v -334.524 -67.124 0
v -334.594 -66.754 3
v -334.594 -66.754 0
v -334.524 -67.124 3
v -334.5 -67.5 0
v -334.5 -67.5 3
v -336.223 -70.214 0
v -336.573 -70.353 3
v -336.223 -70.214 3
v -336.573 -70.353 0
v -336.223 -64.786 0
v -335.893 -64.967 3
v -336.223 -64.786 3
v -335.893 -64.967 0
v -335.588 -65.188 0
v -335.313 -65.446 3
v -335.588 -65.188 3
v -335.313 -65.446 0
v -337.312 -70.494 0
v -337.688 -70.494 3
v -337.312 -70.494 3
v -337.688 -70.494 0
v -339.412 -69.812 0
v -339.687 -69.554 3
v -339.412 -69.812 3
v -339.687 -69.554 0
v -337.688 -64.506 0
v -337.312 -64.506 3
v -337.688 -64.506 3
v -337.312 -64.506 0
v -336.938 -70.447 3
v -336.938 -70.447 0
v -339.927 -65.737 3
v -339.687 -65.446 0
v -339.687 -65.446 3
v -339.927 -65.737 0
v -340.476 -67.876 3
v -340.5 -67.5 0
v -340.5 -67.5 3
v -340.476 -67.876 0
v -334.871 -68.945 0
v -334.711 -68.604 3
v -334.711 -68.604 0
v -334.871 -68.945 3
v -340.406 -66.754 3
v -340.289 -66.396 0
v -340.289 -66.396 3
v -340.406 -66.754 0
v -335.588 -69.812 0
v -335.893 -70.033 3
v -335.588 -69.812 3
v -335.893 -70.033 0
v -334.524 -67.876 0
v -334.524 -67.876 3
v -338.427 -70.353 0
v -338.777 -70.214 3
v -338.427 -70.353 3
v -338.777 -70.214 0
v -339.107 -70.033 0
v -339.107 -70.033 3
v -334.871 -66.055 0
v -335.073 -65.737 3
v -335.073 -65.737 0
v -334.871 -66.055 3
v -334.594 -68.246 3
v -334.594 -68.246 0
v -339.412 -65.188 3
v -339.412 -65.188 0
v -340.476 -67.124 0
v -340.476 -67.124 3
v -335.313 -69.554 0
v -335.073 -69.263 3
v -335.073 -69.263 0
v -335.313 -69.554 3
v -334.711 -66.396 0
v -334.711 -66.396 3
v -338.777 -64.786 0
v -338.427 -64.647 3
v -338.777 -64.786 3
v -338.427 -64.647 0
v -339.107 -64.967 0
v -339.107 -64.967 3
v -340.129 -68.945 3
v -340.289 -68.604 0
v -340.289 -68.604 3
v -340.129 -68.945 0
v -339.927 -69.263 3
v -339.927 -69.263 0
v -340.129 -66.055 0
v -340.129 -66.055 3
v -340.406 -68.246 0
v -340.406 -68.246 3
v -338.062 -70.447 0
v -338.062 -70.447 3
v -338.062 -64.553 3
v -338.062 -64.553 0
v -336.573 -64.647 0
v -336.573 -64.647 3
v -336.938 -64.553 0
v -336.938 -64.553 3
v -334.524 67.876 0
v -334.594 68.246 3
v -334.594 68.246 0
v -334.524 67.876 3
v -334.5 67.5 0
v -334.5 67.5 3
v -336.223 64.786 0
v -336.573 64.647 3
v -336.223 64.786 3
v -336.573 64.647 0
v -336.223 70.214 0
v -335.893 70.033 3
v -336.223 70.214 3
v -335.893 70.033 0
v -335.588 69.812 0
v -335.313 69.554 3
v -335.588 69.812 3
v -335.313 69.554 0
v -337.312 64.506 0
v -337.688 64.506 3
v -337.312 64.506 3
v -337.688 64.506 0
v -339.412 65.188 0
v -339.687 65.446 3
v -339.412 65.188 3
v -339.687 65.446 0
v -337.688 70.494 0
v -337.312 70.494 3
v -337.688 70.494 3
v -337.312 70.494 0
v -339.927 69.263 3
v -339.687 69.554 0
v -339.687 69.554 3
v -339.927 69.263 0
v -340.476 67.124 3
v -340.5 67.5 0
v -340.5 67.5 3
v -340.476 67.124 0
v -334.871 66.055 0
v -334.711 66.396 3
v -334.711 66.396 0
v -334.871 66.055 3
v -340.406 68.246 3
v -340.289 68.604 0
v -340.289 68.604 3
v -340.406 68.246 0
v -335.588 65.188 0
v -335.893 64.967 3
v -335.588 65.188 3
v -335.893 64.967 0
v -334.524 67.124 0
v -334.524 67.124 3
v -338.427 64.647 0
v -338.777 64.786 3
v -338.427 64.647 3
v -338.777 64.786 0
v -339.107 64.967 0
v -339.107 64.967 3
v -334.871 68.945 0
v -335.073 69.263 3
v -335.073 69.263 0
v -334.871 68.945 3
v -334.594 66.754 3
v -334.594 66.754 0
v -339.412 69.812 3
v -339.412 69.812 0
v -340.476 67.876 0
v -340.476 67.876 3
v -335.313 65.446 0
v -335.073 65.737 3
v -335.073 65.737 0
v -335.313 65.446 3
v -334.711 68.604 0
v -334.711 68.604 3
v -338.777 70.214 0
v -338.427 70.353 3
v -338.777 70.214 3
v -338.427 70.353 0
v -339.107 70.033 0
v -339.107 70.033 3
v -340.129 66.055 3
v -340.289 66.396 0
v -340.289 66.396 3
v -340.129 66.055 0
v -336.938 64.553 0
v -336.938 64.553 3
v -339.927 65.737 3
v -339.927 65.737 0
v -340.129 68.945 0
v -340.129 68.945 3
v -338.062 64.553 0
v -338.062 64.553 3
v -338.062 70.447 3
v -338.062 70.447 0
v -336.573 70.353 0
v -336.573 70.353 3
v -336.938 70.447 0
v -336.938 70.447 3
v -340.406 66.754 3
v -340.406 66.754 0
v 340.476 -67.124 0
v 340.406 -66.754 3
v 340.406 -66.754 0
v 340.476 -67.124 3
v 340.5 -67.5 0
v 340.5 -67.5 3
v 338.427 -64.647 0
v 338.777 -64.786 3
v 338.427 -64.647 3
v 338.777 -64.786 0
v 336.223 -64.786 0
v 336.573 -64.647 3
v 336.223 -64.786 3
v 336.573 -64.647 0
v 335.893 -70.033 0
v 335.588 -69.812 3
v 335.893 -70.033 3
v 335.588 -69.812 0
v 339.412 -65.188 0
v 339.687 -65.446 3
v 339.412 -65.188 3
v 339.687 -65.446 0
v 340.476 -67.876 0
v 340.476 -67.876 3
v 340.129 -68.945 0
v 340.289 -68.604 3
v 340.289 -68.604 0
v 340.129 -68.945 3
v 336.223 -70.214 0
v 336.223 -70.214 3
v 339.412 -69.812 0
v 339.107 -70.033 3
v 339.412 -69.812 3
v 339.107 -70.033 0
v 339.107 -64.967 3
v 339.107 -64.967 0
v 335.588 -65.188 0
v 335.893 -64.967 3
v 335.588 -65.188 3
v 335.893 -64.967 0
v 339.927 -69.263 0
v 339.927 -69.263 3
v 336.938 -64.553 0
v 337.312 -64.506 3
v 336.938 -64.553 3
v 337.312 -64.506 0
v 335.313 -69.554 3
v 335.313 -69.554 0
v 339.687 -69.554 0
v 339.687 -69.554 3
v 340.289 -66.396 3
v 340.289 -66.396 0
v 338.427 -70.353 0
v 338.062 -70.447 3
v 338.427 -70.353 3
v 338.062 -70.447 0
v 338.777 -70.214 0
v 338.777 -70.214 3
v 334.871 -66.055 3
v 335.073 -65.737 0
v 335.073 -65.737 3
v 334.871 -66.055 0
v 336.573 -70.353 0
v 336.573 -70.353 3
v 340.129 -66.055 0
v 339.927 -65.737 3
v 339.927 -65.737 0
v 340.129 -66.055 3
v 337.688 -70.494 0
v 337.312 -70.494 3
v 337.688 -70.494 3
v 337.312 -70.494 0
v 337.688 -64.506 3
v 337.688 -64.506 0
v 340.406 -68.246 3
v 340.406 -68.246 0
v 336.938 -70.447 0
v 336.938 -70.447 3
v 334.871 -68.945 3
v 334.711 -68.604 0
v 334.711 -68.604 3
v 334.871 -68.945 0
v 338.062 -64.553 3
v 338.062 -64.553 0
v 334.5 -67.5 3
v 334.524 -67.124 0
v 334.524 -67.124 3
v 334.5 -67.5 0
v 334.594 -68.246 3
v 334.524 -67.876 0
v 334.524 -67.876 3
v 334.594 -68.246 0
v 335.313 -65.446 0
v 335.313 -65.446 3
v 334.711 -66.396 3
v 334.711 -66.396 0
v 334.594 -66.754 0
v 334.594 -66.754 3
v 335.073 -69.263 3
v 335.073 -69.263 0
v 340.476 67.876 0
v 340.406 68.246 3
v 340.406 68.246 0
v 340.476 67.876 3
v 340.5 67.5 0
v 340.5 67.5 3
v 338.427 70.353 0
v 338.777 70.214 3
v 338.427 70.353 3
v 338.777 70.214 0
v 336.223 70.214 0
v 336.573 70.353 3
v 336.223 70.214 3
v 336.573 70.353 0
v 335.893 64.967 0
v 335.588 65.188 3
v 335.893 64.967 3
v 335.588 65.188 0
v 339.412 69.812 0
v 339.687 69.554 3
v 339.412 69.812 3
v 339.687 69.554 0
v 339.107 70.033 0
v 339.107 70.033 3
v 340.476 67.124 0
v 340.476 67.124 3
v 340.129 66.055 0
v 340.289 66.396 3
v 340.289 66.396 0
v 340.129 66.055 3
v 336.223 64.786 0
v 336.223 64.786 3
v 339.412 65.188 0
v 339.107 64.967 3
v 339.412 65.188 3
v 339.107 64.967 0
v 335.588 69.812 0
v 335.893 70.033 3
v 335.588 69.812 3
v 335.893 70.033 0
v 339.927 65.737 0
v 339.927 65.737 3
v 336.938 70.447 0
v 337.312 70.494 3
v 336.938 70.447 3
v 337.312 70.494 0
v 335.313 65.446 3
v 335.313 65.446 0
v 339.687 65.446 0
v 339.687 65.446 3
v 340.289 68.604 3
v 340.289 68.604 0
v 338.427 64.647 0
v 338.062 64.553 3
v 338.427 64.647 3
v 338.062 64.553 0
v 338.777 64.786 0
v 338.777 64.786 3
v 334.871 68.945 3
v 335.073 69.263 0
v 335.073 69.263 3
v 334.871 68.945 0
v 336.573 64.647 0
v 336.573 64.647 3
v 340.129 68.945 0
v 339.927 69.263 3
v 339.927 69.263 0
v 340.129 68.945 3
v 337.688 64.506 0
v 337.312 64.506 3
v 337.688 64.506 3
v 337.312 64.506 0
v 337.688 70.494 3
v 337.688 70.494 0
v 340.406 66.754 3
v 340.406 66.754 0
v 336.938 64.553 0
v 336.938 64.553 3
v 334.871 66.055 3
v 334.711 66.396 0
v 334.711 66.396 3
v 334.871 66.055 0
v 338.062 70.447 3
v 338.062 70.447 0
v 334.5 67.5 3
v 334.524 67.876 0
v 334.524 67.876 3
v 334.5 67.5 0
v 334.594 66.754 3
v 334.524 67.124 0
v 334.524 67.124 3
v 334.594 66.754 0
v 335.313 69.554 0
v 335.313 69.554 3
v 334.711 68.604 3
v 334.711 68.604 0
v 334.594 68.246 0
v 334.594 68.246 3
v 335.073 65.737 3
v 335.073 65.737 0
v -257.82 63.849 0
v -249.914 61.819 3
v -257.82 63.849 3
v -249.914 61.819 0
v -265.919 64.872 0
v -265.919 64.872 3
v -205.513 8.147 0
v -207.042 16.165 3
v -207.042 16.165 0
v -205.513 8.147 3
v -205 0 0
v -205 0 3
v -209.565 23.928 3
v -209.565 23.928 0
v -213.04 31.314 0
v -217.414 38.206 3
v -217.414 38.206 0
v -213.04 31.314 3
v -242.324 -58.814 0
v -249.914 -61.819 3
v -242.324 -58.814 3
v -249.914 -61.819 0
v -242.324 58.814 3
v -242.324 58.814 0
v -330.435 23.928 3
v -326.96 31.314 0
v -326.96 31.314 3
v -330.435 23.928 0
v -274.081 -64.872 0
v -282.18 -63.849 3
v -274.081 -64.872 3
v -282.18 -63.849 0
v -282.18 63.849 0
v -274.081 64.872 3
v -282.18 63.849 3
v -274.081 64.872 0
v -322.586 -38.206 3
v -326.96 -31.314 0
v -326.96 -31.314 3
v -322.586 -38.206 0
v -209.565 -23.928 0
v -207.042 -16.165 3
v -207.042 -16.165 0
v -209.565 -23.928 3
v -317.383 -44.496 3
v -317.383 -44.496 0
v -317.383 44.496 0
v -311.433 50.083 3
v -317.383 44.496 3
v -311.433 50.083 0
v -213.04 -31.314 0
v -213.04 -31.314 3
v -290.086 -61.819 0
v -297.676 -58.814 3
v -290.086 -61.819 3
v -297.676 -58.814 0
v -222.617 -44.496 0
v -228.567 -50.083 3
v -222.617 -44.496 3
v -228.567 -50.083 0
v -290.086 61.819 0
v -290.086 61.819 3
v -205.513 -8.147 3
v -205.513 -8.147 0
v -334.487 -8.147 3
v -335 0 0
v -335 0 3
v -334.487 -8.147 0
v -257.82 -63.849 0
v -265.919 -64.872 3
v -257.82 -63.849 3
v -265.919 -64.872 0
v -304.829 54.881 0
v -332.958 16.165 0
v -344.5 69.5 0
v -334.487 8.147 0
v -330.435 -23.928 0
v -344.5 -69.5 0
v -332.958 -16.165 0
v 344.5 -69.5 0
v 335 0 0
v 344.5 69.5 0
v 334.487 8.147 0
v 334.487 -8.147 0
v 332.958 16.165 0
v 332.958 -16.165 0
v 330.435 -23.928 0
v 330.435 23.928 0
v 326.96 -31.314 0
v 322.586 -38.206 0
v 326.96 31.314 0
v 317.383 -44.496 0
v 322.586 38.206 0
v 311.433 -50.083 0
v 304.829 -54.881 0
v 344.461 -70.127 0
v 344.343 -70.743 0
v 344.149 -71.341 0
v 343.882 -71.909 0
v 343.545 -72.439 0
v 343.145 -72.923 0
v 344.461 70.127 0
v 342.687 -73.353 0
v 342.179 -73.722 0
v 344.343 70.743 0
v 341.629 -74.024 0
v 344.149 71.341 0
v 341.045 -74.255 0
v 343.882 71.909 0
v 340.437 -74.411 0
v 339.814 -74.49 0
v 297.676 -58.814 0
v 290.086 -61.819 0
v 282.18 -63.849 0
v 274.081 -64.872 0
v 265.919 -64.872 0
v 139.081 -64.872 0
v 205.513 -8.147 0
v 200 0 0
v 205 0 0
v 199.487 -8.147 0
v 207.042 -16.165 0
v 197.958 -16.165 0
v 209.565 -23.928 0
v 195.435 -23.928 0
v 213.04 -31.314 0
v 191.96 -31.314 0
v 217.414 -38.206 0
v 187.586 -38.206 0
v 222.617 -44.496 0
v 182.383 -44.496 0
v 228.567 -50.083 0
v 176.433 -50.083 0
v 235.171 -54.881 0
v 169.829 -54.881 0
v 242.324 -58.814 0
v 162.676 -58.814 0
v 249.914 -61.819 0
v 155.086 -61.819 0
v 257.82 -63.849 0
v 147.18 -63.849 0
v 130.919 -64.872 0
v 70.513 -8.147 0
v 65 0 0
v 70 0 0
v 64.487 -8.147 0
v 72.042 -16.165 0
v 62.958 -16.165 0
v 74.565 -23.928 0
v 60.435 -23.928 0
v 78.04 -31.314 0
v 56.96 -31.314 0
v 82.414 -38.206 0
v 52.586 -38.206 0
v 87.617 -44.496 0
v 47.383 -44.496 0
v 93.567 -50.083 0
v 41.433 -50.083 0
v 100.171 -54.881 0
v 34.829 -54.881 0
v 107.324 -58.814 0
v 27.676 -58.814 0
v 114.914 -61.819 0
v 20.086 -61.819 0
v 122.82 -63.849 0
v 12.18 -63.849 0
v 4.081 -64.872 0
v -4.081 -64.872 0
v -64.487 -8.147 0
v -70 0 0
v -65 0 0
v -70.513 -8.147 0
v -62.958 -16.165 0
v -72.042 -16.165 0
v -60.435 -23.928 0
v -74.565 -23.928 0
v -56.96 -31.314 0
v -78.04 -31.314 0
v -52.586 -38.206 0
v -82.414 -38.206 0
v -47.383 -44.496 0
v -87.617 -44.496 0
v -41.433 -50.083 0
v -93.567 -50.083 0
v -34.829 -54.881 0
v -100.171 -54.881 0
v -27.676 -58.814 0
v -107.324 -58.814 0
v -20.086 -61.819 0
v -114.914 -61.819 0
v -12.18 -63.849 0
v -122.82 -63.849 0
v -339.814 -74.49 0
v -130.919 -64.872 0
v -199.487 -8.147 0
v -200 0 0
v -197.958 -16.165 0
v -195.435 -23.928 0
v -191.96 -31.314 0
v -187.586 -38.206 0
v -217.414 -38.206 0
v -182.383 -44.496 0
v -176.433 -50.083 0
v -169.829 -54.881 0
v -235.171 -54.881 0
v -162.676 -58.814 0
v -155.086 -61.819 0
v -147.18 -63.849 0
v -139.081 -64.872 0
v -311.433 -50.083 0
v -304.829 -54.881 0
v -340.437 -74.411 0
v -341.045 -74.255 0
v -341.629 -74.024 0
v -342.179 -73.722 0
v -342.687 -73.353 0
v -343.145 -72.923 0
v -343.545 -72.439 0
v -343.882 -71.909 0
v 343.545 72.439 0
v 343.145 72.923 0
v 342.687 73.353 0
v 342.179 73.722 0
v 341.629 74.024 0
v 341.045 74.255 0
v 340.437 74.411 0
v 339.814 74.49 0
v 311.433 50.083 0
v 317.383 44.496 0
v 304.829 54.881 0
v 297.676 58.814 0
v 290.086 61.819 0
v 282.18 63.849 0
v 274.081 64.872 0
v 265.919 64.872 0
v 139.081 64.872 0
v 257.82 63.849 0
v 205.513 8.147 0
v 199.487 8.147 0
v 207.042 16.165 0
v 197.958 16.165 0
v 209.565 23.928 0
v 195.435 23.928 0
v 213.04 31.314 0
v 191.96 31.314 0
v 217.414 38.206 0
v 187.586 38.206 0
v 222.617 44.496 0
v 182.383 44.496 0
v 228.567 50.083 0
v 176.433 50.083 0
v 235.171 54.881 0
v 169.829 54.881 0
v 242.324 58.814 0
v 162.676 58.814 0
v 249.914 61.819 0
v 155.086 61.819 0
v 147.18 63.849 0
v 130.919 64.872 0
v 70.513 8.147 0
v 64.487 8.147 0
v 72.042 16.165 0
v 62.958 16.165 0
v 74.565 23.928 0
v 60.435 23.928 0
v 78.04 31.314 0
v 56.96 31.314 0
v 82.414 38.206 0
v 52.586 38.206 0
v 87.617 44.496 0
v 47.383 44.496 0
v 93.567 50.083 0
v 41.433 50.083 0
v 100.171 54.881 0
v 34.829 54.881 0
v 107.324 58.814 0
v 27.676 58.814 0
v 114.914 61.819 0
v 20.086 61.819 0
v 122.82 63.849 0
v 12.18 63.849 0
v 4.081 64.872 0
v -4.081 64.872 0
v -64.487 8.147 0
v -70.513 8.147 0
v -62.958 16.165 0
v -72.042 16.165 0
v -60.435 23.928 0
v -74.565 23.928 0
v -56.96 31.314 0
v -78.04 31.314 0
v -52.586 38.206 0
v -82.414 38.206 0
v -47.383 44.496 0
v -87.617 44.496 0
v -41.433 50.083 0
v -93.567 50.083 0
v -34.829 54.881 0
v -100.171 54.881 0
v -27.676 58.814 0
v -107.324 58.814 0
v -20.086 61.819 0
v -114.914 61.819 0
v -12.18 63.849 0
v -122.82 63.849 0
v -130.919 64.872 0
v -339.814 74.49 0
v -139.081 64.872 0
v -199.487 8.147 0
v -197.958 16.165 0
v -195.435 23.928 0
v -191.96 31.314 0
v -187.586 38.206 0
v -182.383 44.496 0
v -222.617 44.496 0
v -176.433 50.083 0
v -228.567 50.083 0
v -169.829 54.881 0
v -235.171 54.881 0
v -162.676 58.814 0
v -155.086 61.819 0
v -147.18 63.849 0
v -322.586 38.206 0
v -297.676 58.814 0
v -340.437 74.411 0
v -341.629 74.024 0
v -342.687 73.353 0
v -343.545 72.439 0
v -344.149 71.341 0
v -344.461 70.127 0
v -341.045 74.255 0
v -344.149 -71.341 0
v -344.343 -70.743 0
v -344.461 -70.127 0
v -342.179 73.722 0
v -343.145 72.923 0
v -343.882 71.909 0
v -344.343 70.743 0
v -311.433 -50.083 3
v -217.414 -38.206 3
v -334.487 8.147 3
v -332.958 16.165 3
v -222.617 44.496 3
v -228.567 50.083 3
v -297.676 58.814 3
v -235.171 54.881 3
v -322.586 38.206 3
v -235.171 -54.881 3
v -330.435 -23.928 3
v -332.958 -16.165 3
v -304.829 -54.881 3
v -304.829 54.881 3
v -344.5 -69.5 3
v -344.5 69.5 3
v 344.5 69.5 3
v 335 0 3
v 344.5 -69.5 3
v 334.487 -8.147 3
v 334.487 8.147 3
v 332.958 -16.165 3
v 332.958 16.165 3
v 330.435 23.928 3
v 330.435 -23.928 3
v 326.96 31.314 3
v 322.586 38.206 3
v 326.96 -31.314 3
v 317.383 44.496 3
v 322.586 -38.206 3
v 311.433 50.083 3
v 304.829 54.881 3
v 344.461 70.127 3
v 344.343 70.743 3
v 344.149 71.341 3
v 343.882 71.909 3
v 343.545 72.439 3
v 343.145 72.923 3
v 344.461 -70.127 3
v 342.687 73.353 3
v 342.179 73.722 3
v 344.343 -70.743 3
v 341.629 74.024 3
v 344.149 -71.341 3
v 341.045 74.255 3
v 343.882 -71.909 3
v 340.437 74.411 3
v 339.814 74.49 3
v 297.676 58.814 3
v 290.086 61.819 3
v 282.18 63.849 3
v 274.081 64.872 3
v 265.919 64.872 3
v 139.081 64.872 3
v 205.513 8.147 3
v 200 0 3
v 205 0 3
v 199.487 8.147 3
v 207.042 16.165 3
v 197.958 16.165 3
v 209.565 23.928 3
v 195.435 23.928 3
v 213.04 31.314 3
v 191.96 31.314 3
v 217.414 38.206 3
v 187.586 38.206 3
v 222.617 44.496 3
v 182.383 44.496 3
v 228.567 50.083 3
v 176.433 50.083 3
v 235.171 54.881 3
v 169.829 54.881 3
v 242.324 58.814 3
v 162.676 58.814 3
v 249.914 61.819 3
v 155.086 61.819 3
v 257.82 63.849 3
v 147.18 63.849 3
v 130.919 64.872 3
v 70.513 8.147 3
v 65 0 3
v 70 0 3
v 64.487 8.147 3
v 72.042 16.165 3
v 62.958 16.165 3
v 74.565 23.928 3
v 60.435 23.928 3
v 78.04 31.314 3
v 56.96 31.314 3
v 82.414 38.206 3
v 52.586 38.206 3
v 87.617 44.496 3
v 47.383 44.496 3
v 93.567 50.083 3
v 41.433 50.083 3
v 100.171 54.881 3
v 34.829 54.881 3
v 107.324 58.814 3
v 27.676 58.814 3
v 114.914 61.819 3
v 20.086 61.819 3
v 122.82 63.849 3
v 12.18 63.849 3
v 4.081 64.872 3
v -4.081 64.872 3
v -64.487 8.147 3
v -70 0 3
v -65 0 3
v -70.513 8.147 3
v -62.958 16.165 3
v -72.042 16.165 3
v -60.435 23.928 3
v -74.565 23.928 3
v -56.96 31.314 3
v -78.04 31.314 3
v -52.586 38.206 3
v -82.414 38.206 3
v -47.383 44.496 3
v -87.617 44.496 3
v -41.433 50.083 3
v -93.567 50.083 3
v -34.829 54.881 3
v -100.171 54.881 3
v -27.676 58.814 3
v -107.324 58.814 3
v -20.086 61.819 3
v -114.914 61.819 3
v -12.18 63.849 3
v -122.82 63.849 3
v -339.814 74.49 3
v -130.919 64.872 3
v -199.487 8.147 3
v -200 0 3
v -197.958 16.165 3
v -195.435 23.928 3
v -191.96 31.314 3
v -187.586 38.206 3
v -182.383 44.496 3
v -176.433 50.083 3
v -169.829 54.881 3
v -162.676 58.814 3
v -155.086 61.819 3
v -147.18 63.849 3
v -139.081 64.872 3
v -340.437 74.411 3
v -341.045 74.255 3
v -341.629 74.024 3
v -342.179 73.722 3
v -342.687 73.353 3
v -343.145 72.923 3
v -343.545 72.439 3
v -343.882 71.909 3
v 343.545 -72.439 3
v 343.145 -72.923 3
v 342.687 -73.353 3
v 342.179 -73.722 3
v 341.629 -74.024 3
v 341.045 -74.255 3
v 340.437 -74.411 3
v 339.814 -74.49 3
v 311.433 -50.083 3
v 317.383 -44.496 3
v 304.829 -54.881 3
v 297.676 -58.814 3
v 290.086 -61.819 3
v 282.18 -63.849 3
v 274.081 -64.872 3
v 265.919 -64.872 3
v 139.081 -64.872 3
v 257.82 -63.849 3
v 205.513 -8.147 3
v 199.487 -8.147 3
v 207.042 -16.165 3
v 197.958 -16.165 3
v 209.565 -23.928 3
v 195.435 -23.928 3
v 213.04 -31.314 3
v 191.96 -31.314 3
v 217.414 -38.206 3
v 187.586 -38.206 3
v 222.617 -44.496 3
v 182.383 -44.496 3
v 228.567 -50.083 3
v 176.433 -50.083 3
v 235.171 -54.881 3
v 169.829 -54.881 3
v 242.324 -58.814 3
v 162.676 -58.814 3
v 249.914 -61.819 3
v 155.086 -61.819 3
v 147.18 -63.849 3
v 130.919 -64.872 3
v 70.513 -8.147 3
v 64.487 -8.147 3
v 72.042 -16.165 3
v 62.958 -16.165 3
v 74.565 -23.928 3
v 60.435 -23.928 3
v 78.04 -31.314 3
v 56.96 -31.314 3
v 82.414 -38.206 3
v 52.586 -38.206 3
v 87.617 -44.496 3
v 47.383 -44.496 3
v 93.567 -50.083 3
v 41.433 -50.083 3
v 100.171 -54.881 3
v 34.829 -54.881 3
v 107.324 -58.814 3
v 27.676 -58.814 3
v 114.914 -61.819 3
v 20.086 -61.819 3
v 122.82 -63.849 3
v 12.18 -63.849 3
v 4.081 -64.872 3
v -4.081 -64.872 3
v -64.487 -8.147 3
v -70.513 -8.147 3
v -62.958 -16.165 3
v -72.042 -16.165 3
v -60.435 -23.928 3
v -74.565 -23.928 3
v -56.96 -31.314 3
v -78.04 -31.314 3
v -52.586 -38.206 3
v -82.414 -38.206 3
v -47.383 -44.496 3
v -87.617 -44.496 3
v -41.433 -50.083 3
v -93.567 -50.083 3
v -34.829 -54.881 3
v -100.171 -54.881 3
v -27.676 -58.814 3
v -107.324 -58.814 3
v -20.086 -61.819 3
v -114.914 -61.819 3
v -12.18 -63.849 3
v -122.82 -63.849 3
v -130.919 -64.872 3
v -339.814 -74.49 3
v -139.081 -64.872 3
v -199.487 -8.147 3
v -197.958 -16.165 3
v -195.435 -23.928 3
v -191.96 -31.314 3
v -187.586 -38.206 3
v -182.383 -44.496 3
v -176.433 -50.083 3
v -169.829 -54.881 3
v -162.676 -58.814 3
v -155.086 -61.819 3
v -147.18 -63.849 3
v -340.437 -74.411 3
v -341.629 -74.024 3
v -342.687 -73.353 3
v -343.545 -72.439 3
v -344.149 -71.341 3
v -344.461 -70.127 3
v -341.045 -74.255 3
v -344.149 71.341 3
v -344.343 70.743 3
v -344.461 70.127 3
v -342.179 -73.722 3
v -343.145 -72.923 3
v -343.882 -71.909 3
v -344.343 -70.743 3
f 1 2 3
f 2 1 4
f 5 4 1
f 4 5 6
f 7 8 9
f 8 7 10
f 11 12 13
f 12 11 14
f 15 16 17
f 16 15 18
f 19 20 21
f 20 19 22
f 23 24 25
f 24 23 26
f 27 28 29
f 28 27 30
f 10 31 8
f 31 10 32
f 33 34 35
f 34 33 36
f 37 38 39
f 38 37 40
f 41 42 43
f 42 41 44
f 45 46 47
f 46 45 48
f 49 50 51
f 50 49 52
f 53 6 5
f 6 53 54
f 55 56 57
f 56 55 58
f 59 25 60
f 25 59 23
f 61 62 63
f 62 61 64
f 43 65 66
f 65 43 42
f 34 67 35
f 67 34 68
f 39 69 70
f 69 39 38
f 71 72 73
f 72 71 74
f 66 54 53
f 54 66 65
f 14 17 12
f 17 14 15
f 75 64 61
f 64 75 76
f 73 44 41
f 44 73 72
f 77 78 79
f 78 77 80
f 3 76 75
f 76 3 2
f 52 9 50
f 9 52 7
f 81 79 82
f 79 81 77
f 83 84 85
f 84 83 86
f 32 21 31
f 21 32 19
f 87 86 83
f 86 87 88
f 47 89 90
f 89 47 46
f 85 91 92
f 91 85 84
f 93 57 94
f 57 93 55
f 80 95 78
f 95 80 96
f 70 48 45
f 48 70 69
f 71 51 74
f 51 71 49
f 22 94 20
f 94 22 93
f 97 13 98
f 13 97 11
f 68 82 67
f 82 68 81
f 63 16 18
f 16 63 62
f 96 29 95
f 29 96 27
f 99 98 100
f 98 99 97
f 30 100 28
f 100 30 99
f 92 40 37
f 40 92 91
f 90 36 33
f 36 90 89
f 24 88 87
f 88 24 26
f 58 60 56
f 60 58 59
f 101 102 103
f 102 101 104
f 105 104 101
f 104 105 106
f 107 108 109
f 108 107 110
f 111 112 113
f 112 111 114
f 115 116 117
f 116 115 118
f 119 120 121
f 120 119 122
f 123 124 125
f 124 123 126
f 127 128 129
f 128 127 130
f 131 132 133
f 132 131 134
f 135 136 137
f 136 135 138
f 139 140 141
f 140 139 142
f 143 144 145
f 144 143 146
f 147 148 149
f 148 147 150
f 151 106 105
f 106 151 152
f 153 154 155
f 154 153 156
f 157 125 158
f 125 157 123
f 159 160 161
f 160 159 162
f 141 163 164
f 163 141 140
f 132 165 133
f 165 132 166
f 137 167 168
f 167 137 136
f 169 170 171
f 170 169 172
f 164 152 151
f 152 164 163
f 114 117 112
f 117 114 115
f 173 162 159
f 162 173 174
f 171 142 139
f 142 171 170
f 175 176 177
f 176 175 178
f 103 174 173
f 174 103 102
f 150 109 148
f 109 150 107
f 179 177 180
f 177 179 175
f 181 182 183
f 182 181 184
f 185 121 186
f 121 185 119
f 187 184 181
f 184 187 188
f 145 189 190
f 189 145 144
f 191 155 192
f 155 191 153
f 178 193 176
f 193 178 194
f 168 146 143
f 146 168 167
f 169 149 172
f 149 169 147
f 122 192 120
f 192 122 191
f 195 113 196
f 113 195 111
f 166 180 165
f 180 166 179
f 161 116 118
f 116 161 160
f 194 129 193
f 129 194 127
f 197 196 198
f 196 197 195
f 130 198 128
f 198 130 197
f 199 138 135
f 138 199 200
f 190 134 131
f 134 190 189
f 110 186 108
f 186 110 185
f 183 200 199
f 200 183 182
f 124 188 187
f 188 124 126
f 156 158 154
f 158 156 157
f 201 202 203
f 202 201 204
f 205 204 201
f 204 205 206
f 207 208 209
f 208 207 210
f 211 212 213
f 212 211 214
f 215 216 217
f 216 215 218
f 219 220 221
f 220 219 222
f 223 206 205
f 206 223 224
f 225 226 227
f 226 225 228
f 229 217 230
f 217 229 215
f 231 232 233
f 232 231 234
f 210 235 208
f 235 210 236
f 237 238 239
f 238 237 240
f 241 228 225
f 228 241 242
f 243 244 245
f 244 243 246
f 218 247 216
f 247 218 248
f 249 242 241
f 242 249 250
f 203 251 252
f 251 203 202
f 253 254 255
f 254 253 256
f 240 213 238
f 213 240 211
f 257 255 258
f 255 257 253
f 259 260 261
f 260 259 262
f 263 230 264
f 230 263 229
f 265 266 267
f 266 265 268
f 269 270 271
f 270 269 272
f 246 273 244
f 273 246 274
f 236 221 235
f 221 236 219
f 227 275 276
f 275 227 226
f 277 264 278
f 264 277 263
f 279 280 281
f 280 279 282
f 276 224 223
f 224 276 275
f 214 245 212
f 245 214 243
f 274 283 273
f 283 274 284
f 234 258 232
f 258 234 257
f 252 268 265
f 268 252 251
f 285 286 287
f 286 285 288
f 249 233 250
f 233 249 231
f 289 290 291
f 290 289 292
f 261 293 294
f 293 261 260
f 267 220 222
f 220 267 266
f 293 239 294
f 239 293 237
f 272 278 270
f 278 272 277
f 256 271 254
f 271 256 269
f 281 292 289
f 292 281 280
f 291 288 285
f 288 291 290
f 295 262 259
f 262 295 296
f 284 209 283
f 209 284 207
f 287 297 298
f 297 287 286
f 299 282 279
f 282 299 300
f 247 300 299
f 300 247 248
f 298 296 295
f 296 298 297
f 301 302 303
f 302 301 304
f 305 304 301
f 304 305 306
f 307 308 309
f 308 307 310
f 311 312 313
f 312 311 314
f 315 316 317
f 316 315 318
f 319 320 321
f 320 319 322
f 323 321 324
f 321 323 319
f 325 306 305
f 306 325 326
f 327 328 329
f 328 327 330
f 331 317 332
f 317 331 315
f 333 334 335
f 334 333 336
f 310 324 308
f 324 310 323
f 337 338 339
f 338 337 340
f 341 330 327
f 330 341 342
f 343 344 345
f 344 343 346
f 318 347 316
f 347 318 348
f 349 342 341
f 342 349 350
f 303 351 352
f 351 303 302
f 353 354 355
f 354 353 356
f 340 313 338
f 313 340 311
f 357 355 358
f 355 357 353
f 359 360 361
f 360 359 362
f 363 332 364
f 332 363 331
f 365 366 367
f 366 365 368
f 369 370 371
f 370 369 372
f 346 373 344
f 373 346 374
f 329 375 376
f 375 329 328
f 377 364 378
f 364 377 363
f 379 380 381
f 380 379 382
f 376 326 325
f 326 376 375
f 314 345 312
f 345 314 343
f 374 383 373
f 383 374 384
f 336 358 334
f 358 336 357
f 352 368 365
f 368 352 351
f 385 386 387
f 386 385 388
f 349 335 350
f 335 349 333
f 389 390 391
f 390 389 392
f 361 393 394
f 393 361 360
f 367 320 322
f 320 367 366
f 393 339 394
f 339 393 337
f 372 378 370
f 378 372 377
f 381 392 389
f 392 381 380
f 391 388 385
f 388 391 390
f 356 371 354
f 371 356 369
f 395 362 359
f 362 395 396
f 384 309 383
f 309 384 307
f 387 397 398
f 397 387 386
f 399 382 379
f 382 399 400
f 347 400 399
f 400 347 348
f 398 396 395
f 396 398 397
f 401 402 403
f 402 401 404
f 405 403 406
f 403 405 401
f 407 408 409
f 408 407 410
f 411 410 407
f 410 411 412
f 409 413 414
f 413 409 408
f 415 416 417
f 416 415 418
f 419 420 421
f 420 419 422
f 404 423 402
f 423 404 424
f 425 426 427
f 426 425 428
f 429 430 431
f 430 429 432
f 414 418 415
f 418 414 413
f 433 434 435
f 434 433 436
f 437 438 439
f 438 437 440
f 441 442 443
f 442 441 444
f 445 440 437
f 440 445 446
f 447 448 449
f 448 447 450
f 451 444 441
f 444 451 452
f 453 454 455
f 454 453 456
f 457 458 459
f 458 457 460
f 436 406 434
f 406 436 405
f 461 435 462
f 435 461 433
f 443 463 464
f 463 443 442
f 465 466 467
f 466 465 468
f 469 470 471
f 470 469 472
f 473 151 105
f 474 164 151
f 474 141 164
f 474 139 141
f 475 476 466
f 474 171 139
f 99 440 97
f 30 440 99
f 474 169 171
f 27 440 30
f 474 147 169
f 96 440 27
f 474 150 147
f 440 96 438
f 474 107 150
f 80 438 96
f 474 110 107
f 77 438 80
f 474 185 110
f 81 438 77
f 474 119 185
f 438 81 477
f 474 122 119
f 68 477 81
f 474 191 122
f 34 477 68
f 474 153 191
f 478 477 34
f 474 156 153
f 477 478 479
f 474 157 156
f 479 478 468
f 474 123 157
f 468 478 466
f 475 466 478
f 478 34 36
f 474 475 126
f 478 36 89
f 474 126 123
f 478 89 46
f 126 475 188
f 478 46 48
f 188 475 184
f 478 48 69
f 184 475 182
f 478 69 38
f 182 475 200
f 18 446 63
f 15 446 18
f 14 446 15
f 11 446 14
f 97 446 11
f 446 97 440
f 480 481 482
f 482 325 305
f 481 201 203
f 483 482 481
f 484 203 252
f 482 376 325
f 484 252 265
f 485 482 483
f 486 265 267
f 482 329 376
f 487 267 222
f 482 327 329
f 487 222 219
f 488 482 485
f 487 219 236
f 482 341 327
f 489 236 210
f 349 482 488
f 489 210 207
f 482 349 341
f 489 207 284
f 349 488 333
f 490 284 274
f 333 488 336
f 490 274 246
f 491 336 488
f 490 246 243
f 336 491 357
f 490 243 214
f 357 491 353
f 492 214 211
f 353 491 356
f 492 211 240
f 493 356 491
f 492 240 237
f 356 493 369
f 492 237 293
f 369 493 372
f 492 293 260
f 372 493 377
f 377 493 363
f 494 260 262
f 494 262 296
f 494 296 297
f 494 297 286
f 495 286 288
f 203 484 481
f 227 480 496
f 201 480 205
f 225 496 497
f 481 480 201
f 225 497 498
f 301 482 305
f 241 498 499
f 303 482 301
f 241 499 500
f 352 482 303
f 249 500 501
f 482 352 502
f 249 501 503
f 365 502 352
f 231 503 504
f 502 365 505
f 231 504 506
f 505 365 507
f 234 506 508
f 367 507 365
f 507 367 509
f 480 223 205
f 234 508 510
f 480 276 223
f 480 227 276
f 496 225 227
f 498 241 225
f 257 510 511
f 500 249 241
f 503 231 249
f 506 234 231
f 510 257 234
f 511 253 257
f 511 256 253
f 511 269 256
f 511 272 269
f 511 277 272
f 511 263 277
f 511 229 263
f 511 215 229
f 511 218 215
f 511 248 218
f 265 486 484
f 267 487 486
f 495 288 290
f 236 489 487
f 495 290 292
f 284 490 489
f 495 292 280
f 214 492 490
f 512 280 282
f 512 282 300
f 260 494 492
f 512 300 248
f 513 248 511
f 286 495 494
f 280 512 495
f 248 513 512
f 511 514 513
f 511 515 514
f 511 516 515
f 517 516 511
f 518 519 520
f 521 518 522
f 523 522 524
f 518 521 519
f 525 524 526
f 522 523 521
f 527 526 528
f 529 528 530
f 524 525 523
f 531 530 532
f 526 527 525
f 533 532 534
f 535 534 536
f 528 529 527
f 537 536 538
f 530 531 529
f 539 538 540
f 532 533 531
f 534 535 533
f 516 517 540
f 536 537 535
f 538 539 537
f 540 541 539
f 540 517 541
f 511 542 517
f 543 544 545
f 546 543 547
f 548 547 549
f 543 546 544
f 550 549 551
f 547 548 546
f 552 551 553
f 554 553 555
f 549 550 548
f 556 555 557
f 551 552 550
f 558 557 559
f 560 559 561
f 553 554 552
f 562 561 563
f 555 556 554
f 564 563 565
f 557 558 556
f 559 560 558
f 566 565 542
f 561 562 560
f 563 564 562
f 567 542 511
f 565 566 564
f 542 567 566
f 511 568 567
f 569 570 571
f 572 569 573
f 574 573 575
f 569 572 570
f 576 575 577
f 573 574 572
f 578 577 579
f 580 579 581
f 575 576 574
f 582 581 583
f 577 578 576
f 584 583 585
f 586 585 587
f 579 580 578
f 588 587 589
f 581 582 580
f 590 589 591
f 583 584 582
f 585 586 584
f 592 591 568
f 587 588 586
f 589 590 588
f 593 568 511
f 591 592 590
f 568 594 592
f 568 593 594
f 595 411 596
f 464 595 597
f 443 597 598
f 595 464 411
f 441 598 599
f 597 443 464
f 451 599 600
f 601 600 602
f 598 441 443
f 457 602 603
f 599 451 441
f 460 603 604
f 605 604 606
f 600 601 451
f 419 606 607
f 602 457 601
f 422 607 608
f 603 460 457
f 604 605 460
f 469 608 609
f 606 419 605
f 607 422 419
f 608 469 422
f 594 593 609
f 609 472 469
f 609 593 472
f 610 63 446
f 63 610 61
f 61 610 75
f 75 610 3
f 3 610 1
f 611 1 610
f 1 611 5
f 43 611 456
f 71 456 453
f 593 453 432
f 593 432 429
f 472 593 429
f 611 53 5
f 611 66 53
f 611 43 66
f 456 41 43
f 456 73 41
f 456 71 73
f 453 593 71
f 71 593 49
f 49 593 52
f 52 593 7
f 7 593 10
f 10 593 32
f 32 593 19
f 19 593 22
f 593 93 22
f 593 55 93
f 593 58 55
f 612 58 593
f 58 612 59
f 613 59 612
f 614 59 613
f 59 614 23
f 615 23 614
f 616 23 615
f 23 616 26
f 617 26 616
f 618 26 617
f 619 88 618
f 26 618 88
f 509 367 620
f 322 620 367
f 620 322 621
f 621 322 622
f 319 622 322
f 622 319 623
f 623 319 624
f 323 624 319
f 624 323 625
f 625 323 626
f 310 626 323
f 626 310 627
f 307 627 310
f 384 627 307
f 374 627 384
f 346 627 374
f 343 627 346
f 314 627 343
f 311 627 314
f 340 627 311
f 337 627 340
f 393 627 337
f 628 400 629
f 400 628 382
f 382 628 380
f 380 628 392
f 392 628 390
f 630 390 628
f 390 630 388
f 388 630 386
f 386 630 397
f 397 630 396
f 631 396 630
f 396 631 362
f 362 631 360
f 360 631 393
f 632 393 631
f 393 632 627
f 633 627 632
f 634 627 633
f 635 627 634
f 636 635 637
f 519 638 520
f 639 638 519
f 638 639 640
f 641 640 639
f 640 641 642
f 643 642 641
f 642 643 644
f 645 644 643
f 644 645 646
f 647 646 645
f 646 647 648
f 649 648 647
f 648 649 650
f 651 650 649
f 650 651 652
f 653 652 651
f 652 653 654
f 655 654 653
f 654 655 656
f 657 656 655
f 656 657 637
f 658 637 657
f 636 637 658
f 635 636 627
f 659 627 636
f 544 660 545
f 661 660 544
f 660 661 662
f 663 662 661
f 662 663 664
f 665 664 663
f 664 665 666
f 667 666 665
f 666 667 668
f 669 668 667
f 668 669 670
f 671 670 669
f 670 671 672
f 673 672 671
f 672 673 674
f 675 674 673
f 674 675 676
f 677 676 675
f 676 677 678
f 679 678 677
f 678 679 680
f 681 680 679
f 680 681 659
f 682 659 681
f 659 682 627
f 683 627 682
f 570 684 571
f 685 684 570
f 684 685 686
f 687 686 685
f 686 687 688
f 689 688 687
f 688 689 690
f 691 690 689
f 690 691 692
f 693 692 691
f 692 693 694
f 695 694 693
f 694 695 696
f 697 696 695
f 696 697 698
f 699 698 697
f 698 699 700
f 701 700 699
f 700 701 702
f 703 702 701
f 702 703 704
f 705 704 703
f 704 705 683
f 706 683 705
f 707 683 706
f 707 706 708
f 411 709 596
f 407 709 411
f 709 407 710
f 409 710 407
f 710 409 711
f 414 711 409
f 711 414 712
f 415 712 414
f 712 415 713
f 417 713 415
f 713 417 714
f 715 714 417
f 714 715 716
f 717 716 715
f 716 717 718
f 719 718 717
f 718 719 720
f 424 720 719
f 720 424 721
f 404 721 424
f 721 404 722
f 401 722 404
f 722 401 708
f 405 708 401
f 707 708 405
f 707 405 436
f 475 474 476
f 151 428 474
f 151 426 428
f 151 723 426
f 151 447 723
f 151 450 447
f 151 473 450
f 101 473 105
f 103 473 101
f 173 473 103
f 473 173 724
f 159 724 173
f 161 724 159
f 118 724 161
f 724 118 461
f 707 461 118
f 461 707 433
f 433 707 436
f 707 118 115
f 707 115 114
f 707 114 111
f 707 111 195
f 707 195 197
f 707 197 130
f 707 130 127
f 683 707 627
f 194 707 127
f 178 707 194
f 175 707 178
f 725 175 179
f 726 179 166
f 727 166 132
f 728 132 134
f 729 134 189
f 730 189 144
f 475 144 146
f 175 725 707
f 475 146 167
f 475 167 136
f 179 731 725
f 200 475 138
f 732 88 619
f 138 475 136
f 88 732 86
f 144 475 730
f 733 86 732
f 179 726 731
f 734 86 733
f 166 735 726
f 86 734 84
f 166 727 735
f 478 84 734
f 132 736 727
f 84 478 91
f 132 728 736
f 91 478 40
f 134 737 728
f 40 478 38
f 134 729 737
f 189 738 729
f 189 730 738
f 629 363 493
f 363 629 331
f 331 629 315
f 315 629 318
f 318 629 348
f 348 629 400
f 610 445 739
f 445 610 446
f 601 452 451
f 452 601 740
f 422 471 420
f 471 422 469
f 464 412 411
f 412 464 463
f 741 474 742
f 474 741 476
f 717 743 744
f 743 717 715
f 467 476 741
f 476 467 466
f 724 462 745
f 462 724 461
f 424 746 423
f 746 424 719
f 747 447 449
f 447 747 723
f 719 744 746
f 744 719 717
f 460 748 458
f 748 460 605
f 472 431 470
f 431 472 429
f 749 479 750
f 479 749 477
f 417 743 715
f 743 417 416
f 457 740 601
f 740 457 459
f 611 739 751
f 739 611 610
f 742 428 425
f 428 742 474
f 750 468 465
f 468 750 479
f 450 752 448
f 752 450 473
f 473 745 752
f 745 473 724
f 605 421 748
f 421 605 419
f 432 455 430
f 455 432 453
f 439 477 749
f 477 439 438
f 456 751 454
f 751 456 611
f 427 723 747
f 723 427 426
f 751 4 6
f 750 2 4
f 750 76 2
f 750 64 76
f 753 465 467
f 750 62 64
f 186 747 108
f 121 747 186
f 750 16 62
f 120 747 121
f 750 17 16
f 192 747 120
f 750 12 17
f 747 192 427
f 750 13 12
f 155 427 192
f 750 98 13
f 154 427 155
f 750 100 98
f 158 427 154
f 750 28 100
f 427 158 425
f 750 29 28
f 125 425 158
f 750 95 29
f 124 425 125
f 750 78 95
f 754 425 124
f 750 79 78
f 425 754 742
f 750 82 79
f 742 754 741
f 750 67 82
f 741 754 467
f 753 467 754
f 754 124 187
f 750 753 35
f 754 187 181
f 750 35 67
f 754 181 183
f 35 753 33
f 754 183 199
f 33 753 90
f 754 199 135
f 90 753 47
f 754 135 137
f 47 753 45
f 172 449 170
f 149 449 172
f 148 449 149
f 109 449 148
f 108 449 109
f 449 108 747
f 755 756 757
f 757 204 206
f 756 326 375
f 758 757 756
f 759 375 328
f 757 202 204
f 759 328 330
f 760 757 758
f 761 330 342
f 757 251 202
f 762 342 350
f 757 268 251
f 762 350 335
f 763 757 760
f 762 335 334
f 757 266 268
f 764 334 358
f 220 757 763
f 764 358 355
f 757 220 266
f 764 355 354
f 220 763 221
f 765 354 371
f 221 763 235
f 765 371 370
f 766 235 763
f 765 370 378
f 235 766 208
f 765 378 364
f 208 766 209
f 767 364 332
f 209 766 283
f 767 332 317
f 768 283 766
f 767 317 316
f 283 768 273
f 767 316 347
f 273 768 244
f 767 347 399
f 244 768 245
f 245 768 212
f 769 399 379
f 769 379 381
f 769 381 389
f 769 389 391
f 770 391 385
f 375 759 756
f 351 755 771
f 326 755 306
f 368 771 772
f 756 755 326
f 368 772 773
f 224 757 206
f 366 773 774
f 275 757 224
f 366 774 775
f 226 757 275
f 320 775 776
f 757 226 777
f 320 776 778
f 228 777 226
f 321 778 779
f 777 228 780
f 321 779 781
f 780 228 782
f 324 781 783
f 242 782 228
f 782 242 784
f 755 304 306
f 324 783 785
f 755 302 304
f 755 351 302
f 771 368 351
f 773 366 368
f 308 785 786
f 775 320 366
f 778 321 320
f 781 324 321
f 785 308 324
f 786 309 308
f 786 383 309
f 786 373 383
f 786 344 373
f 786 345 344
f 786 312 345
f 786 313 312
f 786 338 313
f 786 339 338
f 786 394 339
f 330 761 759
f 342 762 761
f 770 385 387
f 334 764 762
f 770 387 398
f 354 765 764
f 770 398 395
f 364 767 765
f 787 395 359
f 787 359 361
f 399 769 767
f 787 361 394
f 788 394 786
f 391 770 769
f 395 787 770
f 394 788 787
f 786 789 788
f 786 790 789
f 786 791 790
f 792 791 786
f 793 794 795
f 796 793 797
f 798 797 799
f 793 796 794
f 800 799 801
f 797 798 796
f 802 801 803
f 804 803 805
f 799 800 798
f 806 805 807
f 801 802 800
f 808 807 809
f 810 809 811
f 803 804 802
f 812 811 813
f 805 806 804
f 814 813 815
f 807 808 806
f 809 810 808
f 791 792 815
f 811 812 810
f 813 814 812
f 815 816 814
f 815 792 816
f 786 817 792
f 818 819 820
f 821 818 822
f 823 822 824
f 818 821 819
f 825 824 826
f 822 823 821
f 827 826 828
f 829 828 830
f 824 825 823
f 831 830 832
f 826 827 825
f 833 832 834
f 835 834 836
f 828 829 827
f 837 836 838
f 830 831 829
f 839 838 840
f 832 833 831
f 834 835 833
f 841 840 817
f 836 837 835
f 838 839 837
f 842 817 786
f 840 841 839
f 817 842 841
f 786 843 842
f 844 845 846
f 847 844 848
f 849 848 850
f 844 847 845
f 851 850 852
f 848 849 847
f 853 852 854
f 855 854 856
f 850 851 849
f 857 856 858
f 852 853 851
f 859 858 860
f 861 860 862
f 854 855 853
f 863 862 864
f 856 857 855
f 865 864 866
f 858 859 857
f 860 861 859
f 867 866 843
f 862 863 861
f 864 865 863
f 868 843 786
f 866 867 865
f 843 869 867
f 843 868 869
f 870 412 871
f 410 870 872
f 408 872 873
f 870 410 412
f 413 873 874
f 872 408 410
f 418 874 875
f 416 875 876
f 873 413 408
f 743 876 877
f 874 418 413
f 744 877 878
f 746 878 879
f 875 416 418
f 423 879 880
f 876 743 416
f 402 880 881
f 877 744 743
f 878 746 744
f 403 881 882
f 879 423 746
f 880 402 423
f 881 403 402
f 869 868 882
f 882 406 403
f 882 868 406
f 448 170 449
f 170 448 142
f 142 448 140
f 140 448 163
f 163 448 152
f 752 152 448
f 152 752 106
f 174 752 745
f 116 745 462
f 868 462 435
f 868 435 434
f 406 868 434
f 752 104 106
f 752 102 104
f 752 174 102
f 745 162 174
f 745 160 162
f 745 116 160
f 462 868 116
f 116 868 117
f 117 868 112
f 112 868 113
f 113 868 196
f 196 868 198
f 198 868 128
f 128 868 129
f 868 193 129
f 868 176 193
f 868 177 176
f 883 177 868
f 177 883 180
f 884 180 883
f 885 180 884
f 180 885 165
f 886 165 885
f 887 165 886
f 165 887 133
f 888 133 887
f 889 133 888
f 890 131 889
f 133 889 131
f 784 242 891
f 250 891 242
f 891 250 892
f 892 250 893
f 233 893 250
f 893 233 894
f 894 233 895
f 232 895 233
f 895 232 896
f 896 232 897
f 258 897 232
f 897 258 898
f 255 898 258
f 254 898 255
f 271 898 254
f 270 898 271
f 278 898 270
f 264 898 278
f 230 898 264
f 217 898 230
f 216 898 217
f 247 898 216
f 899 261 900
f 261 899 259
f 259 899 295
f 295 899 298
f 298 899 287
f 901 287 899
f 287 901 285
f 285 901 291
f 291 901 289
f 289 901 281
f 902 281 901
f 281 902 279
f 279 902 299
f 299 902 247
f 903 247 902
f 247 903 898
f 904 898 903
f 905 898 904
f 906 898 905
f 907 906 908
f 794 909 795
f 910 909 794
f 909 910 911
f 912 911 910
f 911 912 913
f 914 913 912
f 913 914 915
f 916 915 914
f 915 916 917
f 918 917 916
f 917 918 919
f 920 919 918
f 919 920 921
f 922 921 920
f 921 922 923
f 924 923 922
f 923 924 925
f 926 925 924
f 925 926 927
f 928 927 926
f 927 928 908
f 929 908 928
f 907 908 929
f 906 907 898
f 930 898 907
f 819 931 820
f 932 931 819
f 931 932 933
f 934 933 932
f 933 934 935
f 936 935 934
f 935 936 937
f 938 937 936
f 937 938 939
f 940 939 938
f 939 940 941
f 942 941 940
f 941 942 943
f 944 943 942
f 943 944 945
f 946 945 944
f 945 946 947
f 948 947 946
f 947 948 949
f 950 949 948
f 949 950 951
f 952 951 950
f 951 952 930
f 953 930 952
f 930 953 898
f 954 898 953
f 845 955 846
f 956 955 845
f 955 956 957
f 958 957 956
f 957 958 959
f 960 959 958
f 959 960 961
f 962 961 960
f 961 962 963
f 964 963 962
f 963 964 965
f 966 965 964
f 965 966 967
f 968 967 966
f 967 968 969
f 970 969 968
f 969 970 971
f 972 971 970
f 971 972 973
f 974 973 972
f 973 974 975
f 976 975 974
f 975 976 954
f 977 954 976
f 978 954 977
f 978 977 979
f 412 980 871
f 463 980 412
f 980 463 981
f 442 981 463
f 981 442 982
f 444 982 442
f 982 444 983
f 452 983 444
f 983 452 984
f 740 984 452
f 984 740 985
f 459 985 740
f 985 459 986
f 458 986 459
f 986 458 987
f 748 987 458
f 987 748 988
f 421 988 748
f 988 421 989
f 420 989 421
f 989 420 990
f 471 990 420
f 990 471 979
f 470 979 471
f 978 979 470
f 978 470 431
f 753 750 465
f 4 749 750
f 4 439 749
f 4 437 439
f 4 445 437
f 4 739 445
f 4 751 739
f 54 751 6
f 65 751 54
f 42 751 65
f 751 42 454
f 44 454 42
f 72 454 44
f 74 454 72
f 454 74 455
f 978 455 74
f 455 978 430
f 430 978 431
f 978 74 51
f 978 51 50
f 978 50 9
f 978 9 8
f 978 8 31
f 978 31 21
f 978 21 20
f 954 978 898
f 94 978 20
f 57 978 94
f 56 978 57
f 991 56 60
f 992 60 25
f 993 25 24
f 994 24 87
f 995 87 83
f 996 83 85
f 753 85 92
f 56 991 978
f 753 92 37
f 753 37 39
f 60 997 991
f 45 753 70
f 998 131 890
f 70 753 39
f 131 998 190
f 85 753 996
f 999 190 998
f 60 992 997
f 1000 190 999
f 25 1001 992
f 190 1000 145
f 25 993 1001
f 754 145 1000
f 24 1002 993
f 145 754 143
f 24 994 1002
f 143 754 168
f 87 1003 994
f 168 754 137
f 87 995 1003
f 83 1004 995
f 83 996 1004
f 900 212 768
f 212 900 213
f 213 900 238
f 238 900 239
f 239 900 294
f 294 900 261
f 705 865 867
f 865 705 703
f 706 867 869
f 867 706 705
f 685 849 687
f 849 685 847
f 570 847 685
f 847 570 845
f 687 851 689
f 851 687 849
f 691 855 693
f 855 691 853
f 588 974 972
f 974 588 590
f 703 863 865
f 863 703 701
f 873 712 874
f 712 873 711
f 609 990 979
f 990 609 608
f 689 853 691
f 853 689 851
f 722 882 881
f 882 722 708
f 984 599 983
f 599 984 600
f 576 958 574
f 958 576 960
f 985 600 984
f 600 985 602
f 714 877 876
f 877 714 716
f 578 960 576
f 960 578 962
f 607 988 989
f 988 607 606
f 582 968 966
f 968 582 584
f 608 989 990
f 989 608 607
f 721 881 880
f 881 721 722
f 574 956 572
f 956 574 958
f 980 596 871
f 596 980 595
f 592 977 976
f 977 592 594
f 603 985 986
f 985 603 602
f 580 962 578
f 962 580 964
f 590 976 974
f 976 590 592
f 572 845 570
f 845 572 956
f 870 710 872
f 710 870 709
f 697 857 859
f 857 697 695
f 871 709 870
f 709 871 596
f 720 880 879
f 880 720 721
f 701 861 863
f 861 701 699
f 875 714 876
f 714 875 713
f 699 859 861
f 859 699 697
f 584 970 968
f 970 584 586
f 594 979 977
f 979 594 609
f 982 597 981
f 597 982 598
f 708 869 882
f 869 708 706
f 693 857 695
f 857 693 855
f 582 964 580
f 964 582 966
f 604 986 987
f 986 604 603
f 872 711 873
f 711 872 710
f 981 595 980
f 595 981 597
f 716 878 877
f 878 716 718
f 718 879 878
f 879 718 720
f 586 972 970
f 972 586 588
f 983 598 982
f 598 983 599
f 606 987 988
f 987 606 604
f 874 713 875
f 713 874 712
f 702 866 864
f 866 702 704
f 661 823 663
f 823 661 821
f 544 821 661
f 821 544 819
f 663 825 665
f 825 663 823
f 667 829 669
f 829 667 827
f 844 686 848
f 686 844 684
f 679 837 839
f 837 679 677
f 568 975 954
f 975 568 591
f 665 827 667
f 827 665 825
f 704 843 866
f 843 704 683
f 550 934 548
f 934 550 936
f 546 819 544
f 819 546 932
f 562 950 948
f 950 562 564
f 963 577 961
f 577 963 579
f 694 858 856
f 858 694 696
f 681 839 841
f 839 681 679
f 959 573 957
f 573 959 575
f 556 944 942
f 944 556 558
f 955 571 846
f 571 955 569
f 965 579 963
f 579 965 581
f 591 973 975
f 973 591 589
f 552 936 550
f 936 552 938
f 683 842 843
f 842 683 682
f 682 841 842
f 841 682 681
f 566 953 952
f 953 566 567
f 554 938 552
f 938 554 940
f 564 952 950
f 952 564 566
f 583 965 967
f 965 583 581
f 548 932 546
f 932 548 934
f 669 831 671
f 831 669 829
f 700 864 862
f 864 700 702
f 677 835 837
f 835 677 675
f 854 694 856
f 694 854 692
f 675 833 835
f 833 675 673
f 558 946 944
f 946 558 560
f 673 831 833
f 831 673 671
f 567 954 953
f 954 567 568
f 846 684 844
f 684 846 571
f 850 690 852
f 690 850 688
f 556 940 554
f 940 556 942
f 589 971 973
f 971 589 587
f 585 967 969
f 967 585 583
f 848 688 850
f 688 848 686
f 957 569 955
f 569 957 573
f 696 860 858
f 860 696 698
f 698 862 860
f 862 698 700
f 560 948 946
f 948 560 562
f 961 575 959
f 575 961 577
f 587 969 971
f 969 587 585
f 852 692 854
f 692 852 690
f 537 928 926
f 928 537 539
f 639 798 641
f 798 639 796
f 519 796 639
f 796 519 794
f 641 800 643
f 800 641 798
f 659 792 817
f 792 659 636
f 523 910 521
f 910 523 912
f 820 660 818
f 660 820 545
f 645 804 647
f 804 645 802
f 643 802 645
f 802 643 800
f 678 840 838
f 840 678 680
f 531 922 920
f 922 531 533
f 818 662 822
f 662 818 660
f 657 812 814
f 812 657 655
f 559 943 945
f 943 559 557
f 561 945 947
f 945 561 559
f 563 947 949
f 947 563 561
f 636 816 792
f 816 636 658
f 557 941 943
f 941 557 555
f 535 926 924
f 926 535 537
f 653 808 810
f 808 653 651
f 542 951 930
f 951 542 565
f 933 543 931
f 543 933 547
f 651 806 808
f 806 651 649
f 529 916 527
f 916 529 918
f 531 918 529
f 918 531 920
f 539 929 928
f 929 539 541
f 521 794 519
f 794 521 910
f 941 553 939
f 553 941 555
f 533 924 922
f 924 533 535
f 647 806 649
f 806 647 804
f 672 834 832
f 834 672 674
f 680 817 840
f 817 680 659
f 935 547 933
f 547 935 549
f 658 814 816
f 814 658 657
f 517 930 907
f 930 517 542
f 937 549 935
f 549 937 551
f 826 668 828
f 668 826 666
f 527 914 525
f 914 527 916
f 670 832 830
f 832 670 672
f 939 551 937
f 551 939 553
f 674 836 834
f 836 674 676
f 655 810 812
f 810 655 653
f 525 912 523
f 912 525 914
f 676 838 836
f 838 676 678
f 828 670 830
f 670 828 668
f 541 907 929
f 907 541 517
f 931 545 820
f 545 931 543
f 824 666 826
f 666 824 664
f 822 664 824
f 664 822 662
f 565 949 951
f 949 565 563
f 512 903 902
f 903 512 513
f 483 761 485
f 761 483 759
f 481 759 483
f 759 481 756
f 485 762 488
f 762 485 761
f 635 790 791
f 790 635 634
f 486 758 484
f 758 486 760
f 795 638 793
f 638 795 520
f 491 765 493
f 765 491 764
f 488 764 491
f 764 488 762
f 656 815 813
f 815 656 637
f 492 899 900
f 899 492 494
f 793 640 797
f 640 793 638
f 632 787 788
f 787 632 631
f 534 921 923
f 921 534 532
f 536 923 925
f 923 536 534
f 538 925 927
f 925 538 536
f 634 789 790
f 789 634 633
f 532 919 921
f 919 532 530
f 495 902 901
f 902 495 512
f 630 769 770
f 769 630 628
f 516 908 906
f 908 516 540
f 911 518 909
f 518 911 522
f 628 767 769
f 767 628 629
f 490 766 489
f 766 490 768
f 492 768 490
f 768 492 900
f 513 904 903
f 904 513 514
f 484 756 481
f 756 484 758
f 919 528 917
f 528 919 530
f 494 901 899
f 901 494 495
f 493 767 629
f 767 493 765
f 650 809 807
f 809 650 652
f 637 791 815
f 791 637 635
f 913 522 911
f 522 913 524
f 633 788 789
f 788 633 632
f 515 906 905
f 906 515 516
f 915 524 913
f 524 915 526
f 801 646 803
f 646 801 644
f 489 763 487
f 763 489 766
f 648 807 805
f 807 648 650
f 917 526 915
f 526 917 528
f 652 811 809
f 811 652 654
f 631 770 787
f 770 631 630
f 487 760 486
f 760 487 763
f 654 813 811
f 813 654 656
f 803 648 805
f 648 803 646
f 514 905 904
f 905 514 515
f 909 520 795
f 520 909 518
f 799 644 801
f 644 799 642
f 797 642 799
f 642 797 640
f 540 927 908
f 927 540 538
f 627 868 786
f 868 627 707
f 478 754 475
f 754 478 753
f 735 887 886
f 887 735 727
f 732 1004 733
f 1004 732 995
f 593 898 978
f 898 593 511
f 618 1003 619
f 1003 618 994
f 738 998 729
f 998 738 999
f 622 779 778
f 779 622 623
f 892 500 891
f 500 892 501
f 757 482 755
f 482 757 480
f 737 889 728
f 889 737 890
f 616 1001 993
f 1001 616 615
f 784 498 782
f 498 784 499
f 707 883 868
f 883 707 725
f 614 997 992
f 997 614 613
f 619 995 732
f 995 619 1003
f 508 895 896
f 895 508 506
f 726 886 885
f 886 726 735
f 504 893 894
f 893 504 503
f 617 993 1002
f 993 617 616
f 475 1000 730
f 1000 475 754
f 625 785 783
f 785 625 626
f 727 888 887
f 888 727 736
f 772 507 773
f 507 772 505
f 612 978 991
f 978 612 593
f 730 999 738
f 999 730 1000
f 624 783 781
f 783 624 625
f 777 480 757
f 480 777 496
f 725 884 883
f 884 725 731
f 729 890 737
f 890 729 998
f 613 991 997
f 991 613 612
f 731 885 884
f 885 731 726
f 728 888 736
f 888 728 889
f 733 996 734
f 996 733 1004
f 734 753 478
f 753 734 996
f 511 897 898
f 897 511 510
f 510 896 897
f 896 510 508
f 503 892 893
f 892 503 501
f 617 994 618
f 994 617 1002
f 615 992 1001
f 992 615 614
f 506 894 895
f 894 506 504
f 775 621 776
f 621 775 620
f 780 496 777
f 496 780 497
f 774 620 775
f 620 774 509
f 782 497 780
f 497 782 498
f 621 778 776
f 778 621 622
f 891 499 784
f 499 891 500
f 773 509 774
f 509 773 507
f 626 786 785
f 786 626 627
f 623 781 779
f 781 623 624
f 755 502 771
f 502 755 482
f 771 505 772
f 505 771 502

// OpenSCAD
$fn = 50;


difference() {
	union() {
		hull() {
			translate(v = [-339.5000000000, 69.5000000000, 0]) {
				cylinder(h = 3, r = 5);
			}
			translate(v = [339.5000000000, 69.5000000000, 0]) {
				cylinder(h = 3, r = 5);
			}
			translate(v = [-339.5000000000, -69.5000000000, 0]) {
				cylinder(h = 3, r = 5);
			}
			translate(v = [339.5000000000, -69.5000000000, 0]) {
				cylinder(h = 3, r = 5);
			}
		}
	}
	union() {
		#translate(v = [-337.5000000000, -67.5000000000, -100.0000000000]) {
			cylinder(h = 200, r = 3.0000000000);
		}
		#translate(v = [-337.5000000000, 67.5000000000, -100.0000000000]) {
			cylinder(h = 200, r = 3.0000000000);
		}
		#translate(v = [337.5000000000, -67.5000000000, -100.0000000000]) {
			cylinder(h = 200, r = 3.0000000000);
		}
		#translate(v = [337.5000000000, 67.5000000000, -100.0000000000]) {
			cylinder(h = 200, r = 3.0000000000);
		}
		#translate(v = [-270.0000000000, 0, 0]) {
			cylinder(h = 3, r = 65.0000000000);
		}
		#translate(v = [-135.0000000000, 0, 0]) {
			cylinder(h = 3, r = 65.0000000000);
		}
		#cylinder(h = 3, r = 65.0000000000);
		#translate(v = [135.0000000000, 0, 0]) {
			cylinder(h = 3, r = 65.0000000000);
		}
		#translate(v = [270.0000000000, 0, 0]) {
			cylinder(h = 3, r = 65.0000000000);
		}
	}
}
